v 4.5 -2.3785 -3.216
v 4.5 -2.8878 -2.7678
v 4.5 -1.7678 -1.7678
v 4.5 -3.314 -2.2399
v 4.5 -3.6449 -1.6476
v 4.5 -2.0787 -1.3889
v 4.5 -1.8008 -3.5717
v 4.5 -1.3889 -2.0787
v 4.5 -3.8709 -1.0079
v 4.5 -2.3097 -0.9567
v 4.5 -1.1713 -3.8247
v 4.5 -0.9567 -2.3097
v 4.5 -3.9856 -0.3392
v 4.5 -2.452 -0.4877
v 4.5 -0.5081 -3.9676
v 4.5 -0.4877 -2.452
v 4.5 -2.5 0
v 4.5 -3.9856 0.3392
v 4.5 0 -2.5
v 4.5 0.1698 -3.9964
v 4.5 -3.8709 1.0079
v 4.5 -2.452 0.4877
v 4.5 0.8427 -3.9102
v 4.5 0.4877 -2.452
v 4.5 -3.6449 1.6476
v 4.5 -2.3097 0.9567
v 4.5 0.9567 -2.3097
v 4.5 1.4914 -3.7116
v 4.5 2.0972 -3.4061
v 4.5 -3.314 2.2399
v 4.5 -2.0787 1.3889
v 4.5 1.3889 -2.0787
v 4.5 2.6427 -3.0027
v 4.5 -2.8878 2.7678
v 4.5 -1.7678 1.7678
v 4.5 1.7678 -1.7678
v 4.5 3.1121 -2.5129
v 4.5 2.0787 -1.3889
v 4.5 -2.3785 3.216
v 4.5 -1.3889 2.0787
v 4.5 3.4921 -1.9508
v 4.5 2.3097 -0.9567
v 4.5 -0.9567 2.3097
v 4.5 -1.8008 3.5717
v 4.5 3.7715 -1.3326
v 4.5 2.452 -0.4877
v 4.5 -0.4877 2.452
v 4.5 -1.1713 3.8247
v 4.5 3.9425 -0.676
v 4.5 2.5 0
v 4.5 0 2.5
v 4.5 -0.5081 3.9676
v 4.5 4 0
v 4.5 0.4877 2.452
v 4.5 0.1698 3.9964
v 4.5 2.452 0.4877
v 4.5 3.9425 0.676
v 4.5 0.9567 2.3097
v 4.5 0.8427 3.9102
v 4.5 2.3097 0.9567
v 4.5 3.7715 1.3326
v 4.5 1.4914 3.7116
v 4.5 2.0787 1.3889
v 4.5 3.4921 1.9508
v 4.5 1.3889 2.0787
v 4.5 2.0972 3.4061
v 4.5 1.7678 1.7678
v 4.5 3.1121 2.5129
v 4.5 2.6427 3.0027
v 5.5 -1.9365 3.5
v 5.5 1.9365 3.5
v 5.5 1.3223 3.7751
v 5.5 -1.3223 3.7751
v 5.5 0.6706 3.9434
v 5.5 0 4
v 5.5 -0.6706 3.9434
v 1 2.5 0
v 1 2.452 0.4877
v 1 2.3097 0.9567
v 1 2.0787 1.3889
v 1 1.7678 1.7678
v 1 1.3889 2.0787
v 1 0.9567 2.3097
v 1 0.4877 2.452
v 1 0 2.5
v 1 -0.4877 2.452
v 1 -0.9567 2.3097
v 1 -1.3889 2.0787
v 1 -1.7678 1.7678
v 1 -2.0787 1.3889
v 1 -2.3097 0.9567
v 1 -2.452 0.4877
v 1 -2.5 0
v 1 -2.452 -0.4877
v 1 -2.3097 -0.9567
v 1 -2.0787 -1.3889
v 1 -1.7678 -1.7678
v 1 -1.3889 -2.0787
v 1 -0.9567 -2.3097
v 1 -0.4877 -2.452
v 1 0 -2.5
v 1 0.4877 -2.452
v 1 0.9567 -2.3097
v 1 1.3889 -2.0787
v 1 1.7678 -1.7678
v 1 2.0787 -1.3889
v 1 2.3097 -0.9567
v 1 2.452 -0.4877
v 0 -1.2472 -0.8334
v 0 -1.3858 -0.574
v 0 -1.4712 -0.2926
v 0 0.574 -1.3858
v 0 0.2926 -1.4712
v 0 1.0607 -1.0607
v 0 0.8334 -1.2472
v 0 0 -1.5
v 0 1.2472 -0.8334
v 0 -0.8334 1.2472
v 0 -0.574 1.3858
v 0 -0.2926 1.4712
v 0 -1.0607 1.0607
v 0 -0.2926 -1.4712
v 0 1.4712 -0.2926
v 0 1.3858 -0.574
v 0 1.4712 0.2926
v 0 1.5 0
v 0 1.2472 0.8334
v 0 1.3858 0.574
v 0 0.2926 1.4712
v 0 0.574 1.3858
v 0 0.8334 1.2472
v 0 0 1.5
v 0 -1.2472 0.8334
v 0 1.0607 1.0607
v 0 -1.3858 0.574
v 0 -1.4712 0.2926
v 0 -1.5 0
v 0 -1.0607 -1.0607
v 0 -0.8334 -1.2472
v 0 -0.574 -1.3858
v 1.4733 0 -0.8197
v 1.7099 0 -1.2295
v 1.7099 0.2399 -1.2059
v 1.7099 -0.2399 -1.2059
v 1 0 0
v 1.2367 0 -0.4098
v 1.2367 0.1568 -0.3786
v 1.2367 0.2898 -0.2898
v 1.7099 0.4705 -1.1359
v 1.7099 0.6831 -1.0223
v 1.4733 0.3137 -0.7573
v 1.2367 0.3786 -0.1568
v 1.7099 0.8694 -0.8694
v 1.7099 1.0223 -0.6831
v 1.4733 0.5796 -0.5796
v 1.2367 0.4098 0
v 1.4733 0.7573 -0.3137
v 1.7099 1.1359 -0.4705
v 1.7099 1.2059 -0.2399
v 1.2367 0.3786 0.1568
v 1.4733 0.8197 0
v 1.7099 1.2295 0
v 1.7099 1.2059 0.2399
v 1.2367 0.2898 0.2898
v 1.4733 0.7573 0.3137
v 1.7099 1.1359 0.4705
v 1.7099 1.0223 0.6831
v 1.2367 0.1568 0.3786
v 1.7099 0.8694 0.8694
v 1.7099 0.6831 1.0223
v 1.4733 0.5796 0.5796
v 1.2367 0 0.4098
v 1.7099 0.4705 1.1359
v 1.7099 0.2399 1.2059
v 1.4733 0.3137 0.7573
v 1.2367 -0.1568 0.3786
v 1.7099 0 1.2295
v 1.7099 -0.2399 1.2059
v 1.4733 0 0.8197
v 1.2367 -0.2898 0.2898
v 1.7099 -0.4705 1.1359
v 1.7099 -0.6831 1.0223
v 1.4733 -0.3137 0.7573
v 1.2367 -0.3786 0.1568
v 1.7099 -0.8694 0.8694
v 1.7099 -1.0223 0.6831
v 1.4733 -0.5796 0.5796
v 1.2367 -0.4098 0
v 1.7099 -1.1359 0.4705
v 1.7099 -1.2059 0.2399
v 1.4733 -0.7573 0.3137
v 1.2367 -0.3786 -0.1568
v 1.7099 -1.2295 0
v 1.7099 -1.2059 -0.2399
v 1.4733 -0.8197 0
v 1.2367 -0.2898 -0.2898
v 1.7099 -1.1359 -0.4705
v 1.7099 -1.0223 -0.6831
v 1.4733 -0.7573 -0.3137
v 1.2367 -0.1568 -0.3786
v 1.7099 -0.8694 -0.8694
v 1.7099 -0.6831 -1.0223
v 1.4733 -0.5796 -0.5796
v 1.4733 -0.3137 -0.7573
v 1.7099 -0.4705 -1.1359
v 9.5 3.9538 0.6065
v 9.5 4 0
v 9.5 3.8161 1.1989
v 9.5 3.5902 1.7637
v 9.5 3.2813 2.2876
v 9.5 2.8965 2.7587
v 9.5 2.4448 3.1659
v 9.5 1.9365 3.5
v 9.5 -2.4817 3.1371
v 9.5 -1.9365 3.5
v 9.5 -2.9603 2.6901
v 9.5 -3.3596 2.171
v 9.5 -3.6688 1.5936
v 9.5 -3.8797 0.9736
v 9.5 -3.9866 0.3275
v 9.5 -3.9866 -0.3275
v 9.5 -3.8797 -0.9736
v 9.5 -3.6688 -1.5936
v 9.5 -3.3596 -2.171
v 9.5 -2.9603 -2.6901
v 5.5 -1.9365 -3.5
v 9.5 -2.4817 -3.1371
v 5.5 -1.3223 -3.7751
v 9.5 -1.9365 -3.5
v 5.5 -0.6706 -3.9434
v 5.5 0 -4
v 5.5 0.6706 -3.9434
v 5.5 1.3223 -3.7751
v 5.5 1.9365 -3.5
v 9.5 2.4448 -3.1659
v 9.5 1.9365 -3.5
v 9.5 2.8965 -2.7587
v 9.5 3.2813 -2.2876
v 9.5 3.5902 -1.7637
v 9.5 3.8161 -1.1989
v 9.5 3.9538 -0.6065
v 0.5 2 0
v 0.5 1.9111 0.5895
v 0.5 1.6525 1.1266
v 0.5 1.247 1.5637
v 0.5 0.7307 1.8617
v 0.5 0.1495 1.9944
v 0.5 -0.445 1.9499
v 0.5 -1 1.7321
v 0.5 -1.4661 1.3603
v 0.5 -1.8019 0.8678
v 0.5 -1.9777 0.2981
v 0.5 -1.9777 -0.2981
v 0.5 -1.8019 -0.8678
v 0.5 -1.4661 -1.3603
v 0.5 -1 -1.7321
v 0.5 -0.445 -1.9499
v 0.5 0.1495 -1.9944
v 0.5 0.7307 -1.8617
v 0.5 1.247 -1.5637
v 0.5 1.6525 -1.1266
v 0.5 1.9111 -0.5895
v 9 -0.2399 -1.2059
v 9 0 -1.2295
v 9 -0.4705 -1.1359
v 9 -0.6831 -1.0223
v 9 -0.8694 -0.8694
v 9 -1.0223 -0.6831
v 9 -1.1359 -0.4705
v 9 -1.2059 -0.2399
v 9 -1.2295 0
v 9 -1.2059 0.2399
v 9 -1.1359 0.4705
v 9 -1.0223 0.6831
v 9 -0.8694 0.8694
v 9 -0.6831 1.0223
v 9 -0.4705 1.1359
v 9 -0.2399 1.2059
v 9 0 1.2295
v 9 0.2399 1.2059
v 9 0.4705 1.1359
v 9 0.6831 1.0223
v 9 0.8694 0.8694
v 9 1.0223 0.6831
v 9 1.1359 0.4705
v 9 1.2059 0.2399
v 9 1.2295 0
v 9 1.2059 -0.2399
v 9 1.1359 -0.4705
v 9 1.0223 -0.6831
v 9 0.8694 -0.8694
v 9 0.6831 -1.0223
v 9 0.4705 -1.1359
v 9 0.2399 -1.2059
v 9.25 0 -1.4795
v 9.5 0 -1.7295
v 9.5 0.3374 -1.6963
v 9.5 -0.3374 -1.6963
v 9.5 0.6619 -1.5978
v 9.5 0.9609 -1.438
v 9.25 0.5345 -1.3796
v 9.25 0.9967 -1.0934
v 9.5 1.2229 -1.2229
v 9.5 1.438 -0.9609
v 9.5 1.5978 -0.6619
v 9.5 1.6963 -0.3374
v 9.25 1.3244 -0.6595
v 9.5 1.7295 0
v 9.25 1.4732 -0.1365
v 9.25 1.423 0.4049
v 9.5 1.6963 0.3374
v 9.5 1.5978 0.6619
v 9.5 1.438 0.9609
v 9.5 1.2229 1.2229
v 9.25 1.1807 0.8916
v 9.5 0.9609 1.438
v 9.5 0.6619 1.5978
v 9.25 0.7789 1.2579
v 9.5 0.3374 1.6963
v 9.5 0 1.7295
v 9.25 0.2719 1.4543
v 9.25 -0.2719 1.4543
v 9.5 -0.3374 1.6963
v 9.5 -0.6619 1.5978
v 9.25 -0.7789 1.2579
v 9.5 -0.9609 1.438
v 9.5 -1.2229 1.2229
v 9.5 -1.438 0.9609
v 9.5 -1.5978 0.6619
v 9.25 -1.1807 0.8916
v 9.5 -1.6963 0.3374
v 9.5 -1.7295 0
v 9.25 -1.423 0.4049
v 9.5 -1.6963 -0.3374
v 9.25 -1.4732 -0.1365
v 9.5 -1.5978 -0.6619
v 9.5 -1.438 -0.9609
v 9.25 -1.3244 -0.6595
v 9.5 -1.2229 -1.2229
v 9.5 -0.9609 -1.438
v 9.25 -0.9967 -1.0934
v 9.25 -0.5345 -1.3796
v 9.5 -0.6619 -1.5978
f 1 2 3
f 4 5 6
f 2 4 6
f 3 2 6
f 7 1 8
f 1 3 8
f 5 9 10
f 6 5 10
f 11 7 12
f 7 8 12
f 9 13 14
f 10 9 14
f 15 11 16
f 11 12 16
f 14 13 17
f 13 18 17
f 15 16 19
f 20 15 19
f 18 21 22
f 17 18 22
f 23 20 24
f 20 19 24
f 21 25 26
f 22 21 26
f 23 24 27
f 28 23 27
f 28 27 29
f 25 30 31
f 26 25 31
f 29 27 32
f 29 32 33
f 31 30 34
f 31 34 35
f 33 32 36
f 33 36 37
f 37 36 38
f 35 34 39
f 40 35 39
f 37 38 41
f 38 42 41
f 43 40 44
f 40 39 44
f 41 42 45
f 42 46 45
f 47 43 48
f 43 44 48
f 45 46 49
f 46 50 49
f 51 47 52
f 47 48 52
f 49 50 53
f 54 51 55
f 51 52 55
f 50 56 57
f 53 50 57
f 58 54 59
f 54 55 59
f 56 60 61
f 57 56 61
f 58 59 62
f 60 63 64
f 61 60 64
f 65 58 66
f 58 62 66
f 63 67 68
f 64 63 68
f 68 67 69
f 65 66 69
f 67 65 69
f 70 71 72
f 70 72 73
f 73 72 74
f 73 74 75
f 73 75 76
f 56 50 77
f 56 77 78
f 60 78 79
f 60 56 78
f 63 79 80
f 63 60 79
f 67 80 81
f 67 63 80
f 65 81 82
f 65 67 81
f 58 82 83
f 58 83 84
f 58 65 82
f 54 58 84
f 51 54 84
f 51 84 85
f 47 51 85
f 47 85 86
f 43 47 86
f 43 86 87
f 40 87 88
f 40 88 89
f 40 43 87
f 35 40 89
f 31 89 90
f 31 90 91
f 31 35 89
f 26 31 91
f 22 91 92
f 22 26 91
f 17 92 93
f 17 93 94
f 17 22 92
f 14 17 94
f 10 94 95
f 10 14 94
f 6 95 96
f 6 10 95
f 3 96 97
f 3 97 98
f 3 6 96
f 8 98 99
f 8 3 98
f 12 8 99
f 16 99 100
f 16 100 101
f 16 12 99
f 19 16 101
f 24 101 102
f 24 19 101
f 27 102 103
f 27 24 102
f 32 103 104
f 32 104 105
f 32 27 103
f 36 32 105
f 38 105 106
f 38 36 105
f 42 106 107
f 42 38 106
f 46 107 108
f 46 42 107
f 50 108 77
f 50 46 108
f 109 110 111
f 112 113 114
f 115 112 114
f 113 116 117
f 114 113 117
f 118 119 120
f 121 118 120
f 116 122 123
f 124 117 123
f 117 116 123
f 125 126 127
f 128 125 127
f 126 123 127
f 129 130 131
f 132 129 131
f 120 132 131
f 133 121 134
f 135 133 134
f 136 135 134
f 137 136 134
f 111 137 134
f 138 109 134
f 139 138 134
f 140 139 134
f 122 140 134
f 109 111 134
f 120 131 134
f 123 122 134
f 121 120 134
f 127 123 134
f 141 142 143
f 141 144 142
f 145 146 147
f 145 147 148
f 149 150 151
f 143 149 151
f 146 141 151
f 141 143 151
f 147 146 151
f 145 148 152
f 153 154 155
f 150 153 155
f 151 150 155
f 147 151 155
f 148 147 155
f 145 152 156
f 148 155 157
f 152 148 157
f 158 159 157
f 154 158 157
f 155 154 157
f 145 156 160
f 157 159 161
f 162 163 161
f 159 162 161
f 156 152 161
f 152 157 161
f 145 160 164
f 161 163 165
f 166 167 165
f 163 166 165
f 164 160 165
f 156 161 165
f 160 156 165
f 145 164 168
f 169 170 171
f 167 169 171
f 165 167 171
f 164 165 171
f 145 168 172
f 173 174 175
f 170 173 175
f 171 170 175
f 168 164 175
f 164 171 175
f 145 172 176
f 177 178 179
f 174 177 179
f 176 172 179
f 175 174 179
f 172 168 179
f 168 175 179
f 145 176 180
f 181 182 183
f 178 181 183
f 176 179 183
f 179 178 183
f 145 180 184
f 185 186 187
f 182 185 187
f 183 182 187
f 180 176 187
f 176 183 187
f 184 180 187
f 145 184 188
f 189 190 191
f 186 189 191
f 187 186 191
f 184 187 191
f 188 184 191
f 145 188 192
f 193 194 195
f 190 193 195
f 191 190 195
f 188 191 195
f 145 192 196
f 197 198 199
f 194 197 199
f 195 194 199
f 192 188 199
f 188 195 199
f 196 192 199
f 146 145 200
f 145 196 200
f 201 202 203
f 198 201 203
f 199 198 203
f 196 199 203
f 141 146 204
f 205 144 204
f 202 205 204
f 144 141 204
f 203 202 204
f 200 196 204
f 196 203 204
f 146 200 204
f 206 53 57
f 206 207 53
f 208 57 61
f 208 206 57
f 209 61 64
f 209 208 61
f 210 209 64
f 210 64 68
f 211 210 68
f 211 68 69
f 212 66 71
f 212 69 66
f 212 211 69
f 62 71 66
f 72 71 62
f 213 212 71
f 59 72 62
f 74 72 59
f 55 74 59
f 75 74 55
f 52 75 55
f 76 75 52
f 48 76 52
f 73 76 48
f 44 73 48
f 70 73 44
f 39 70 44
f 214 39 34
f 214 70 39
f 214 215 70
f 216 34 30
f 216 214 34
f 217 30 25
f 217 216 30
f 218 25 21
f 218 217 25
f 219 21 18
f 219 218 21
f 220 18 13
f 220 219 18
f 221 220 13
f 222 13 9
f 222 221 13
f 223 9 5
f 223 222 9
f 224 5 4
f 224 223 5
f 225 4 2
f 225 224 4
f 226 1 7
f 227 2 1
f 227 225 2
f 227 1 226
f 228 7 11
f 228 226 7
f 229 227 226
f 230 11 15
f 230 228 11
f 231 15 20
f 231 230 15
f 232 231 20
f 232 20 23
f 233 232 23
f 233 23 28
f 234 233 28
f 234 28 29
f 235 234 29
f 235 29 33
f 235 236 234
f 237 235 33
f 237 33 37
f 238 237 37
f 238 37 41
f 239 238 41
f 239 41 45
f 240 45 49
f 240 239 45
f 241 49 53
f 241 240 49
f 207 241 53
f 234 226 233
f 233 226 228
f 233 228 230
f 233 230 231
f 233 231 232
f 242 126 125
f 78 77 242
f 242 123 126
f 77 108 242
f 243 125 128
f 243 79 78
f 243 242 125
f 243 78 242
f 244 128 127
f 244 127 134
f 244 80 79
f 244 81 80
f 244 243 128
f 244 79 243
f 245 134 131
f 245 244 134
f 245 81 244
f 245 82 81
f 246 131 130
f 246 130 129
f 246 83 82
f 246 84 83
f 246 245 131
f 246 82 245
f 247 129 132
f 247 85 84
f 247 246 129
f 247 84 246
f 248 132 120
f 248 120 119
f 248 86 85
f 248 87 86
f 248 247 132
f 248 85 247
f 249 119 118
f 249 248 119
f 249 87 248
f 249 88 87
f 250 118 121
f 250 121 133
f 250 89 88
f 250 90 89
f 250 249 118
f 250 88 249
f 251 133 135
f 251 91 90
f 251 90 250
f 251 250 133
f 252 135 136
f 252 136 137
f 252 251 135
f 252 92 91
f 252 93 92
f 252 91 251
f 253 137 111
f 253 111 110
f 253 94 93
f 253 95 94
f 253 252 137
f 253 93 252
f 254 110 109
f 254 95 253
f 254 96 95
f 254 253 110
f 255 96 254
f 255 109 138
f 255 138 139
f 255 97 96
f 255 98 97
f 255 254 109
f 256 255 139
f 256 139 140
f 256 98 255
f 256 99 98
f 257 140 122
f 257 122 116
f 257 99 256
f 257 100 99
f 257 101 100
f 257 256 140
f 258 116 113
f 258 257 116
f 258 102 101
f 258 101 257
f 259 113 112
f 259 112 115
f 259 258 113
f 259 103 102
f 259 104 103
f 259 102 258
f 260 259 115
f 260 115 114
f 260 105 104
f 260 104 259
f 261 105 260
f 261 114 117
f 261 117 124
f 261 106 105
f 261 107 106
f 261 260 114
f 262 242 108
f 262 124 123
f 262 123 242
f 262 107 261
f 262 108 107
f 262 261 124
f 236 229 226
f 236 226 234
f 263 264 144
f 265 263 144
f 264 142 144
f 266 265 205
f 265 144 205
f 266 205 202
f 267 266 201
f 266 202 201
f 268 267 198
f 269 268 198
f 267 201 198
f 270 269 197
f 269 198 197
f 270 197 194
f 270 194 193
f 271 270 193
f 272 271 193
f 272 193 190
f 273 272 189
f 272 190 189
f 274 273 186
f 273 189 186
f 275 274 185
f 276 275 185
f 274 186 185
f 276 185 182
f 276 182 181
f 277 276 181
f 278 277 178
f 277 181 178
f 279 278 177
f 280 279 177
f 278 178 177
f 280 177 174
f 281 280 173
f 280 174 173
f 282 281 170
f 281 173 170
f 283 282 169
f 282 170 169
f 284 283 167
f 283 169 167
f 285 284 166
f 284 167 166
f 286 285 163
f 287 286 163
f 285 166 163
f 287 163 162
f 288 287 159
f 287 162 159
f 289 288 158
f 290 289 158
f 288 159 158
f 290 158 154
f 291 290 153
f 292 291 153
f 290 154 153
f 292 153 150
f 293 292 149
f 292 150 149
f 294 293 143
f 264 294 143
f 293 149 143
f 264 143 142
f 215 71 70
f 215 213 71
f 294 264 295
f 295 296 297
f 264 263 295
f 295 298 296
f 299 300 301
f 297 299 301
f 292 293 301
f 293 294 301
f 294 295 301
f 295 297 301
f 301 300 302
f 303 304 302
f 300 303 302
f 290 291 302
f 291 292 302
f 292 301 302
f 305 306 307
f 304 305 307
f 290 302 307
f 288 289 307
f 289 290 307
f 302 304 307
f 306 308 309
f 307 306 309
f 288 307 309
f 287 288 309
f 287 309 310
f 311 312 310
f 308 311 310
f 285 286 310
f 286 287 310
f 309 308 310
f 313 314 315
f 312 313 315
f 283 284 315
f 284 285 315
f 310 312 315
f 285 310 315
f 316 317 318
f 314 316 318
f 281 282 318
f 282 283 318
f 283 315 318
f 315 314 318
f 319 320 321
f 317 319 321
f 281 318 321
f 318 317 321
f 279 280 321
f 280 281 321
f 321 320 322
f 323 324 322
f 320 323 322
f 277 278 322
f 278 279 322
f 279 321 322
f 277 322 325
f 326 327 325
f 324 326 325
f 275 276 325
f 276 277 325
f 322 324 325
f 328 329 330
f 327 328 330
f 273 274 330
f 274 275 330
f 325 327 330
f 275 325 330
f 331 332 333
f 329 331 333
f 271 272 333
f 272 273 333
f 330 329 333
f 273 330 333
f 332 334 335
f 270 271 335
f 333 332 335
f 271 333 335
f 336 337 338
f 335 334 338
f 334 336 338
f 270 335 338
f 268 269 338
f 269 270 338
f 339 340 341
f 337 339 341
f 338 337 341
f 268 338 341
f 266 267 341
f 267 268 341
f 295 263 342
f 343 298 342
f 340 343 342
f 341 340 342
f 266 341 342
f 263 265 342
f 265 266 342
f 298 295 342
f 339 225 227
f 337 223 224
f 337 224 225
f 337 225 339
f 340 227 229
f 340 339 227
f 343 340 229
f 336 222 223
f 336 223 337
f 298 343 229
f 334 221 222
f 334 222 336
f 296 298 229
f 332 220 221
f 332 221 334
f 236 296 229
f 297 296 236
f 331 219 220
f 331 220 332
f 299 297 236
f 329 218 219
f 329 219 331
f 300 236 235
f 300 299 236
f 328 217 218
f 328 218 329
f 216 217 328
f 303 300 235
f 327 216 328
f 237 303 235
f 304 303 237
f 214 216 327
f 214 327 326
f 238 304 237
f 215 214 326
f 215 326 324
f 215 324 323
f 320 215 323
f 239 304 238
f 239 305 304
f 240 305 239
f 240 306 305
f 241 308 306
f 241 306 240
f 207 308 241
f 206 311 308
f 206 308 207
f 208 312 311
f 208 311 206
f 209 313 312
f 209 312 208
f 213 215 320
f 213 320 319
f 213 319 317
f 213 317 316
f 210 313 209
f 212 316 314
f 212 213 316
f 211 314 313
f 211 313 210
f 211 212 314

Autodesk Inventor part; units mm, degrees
sketch "Sketch_1" plane through (0, 0, 0) normal (0, 0, 1) x (1, 0, 0)
  line L0 (9.5, 0) -> (0, 0)
  line L1 (0, 0) -> (0, 1.5)
  line L2 (0, 1.5) -> (1, 2.5)
  line L3 (1, 2.5) -> (4.5, 2.5)
  line L4 (4.5, 2.5) -> (4.5, 4)
  line L5 (4.5, 4) -> (9.5, 4)
  line L6 (9.5, 4) -> (9.5, 0)
  line L7 (9.5, 0) -> (0, 0)
revolve "Revolution1" add sketch "Sketch_1" angle 360 about axis through (9.5, 0, 0) along (1, 0, 0)
sketch "Sketch2" plane through (9.5, 0, 0) normal (1, 0, 0) x (0, 0, -1)
  point P0 (0, 0)
hole "Hole1" at (9.5, 0, 0) direction (-1, 0, 0) diameter 2.459 depth 7.7901 tip angle 120 countersink diameter 3.459 countersink angle 90 thread size "M3x0.5" class "6H" standard "ISO Metric profile"
sketch "Sketch_2" plane through (9.5, 0, 0) normal (1, 0, 0) x (0, 0, -1)
  line L0 (-7, 7) -> (-7, -7)
  line L1 (-7, -7) -> (7, -7)
  line L2 (7, -7) -> (7, 7)
  line L3 (7, 7) -> (-7, 7)
  line L4 (-3.5, 1.9571) -> (-3.5, -1.9571)
  arc A0 (-3.5, -1.9571) -> (3.5, -1.9571) centre (0, 0) ccw
  line L5 (3.5, -1.9571) -> (3.5, 1.9571)
  arc A1 (3.5, 1.9571) -> (-3.5, 1.9571) centre (0, 0) ccw
extrude "Extrusion1" cut sketch "Sketch_2" against normal blind 4
ref_plane "core_rod_XY" through (4.5, 0, 0) normal (1, 0, 0) x (0, 0, -1)
ref_plane "core_rod_YZ" through (4.5, 0, 0) normal (0, 0, -1) x (0, 1, 0)
ref_plane "core_rod_ZX" through (4.5, 0, 0) normal (0, 1, 0) x (1, 0, 0)
properties part number "URLM8_c"
